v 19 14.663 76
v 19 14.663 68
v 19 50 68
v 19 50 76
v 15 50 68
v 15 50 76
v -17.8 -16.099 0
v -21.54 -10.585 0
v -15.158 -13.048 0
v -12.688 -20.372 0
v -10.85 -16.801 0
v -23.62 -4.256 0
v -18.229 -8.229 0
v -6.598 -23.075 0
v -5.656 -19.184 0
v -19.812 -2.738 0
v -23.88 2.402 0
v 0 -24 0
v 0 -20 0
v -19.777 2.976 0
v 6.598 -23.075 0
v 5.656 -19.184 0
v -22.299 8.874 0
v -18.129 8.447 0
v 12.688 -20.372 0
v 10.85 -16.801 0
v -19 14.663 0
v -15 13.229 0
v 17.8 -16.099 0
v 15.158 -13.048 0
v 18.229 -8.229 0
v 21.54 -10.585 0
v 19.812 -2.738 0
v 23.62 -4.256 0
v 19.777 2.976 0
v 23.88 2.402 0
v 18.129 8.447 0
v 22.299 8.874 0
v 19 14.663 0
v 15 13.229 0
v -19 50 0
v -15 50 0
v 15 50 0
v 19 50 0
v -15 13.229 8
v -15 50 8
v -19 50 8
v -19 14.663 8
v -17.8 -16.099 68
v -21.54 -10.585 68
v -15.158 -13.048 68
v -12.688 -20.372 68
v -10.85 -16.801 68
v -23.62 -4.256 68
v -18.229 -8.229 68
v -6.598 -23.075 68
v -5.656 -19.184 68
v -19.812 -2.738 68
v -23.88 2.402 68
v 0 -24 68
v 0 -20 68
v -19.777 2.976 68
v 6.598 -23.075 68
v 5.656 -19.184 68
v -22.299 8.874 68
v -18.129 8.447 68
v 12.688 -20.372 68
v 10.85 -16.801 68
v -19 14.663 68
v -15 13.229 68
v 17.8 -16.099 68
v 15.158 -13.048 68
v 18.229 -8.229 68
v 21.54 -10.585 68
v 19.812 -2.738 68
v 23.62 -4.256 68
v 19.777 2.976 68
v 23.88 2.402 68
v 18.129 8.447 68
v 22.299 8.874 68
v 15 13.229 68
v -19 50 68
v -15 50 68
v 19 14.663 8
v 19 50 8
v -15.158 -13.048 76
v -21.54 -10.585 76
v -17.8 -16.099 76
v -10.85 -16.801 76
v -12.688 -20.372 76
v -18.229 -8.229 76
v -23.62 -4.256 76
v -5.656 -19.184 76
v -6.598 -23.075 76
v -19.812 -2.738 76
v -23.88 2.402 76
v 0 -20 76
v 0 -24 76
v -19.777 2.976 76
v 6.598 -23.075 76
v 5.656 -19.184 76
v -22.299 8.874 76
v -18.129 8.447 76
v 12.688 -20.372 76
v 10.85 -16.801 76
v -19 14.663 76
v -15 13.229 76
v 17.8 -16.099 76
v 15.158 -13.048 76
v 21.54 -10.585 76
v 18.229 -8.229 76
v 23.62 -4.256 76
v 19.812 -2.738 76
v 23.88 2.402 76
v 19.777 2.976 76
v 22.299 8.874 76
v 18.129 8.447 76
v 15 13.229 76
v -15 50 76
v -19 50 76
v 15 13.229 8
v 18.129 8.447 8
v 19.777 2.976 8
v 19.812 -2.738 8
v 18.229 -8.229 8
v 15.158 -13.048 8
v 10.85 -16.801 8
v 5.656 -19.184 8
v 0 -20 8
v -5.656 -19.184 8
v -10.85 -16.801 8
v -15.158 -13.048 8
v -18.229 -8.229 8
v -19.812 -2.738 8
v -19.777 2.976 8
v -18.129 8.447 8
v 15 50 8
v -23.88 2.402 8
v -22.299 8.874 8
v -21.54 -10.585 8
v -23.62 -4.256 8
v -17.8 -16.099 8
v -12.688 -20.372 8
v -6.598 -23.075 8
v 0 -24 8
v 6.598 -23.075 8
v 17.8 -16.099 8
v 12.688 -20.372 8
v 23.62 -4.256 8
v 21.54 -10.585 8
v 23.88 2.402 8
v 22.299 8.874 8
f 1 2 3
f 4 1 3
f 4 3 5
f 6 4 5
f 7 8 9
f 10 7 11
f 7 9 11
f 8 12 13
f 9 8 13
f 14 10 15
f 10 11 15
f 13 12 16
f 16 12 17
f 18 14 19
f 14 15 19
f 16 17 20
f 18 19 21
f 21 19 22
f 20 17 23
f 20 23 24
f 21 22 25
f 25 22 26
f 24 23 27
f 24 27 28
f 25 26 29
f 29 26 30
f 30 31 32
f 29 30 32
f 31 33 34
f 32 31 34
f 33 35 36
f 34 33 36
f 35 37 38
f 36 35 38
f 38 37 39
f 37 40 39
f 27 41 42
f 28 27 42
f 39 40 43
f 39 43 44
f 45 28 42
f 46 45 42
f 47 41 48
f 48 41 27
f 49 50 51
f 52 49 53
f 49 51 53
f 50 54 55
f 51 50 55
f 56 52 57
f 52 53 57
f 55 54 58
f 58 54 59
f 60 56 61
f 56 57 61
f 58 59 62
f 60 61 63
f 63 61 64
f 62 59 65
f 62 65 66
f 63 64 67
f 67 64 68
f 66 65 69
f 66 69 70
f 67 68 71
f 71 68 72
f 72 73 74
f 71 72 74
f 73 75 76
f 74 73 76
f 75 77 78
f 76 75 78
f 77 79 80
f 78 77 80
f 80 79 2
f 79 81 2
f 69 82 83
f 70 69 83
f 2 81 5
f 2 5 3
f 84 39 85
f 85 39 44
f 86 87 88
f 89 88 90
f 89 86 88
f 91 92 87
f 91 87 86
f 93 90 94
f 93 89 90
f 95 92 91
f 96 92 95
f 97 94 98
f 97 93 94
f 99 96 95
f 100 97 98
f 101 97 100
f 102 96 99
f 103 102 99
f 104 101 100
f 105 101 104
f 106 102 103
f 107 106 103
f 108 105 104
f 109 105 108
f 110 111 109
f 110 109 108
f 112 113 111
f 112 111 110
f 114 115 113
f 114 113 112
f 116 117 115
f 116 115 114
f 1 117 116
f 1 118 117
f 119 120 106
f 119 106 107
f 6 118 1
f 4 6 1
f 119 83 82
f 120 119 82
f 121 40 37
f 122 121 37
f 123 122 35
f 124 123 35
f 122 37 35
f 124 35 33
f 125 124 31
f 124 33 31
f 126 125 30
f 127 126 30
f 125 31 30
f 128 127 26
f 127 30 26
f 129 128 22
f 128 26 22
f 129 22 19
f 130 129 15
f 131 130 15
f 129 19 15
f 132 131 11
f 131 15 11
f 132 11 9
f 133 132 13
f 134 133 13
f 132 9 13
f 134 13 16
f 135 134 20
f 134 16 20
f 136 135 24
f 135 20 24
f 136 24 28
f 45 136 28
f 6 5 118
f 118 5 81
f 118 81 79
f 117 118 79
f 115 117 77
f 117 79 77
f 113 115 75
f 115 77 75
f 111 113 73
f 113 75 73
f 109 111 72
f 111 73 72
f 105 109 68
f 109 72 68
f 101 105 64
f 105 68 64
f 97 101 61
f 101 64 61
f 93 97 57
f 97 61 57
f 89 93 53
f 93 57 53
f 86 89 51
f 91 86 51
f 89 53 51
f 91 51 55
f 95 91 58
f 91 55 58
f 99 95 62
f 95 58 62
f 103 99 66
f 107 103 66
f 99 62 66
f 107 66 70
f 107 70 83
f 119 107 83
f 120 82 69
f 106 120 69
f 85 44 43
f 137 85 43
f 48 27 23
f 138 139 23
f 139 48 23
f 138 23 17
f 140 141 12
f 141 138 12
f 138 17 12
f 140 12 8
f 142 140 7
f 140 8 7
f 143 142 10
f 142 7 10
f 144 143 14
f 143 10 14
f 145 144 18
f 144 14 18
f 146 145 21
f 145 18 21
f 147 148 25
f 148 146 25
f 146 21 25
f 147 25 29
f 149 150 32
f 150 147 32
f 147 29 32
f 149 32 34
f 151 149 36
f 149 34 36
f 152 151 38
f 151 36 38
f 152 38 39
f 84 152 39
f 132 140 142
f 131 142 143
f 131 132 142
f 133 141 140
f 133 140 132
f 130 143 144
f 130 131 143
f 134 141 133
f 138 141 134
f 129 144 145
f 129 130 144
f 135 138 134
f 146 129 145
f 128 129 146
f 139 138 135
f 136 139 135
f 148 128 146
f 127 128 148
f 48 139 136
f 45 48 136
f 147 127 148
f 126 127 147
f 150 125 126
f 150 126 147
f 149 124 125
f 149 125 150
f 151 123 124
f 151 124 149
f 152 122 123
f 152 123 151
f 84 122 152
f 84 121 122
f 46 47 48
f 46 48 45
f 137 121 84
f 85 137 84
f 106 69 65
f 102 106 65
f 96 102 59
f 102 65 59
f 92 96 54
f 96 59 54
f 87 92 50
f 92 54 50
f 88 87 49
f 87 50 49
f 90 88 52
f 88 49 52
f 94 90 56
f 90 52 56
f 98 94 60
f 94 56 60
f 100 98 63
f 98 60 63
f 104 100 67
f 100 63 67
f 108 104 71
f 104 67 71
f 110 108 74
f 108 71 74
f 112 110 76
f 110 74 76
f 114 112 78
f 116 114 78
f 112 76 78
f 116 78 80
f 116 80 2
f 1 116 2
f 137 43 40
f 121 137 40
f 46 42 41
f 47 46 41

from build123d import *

# Parameters (mm, degrees)
EXTRUDE_1_DEPTH          = 76
CUT_EXTRUDE_2_DEPTH      = 30
CUT_EXTRUDE_2_DEPTH_BACK = 30
SKETCH_3_W               = 62.399704462
SKETCH_3_H               = 130


with BuildPart() as part:
    # 草图1 → 凸台-拉伸1 (new body)
    with BuildSketch(Plane.XY):
        with BuildLine():
            Line((-19, 50), (-19, 14.662878299))
            ThreePointArc((-19, 14.662878299), (0, -24), (19, 14.662878299))
            Line((19, 14.662878299), (19, 50))
            Line((19, 50), (15, 50))
            Line((15, 50), (15, 13.228756555))
            ThreePointArc((15, 13.228756555), (0, -20), (-15, 13.228756555))
            Line((-15, 13.228756555), (-15, 50))
            Line((-15, 50), (-19, 50))
        make_face()
    extrude(amount=EXTRUDE_1_DEPTH)

    # 草图3 → 切除-拉伸2 (cut, two sides: drawn at the far end of the back side and taken through both)
    with BuildSketch(Plane.XY.offset(38).offset(-CUT_EXTRUDE_2_DEPTH_BACK)):
        with Locations((-5.457937597, -9.843031008)):
            Rectangle(SKETCH_3_W, SKETCH_3_H)
    extrude(amount=CUT_EXTRUDE_2_DEPTH + CUT_EXTRUDE_2_DEPTH_BACK, mode=Mode.SUBTRACT)


with BuildPart() as cut_extrude_2_piece_1:
    # of the separate pieces the step leaves, piece 1, a body of its own (cut_extrude_2_pieces)
    add(part.part.solids().sort_by_distance((-15, 13.228756555, 0))[0])


with BuildPart() as cut_extrude_2_piece_2:
    # of the separate pieces the step leaves, piece 2, a body of its own (cut_extrude_2_pieces)
    add(part.part.solids().sort_by_distance((-15, 50, 68))[0])


solid = Compound([cut_extrude_2_piece_1.part, cut_extrude_2_piece_2.part])
